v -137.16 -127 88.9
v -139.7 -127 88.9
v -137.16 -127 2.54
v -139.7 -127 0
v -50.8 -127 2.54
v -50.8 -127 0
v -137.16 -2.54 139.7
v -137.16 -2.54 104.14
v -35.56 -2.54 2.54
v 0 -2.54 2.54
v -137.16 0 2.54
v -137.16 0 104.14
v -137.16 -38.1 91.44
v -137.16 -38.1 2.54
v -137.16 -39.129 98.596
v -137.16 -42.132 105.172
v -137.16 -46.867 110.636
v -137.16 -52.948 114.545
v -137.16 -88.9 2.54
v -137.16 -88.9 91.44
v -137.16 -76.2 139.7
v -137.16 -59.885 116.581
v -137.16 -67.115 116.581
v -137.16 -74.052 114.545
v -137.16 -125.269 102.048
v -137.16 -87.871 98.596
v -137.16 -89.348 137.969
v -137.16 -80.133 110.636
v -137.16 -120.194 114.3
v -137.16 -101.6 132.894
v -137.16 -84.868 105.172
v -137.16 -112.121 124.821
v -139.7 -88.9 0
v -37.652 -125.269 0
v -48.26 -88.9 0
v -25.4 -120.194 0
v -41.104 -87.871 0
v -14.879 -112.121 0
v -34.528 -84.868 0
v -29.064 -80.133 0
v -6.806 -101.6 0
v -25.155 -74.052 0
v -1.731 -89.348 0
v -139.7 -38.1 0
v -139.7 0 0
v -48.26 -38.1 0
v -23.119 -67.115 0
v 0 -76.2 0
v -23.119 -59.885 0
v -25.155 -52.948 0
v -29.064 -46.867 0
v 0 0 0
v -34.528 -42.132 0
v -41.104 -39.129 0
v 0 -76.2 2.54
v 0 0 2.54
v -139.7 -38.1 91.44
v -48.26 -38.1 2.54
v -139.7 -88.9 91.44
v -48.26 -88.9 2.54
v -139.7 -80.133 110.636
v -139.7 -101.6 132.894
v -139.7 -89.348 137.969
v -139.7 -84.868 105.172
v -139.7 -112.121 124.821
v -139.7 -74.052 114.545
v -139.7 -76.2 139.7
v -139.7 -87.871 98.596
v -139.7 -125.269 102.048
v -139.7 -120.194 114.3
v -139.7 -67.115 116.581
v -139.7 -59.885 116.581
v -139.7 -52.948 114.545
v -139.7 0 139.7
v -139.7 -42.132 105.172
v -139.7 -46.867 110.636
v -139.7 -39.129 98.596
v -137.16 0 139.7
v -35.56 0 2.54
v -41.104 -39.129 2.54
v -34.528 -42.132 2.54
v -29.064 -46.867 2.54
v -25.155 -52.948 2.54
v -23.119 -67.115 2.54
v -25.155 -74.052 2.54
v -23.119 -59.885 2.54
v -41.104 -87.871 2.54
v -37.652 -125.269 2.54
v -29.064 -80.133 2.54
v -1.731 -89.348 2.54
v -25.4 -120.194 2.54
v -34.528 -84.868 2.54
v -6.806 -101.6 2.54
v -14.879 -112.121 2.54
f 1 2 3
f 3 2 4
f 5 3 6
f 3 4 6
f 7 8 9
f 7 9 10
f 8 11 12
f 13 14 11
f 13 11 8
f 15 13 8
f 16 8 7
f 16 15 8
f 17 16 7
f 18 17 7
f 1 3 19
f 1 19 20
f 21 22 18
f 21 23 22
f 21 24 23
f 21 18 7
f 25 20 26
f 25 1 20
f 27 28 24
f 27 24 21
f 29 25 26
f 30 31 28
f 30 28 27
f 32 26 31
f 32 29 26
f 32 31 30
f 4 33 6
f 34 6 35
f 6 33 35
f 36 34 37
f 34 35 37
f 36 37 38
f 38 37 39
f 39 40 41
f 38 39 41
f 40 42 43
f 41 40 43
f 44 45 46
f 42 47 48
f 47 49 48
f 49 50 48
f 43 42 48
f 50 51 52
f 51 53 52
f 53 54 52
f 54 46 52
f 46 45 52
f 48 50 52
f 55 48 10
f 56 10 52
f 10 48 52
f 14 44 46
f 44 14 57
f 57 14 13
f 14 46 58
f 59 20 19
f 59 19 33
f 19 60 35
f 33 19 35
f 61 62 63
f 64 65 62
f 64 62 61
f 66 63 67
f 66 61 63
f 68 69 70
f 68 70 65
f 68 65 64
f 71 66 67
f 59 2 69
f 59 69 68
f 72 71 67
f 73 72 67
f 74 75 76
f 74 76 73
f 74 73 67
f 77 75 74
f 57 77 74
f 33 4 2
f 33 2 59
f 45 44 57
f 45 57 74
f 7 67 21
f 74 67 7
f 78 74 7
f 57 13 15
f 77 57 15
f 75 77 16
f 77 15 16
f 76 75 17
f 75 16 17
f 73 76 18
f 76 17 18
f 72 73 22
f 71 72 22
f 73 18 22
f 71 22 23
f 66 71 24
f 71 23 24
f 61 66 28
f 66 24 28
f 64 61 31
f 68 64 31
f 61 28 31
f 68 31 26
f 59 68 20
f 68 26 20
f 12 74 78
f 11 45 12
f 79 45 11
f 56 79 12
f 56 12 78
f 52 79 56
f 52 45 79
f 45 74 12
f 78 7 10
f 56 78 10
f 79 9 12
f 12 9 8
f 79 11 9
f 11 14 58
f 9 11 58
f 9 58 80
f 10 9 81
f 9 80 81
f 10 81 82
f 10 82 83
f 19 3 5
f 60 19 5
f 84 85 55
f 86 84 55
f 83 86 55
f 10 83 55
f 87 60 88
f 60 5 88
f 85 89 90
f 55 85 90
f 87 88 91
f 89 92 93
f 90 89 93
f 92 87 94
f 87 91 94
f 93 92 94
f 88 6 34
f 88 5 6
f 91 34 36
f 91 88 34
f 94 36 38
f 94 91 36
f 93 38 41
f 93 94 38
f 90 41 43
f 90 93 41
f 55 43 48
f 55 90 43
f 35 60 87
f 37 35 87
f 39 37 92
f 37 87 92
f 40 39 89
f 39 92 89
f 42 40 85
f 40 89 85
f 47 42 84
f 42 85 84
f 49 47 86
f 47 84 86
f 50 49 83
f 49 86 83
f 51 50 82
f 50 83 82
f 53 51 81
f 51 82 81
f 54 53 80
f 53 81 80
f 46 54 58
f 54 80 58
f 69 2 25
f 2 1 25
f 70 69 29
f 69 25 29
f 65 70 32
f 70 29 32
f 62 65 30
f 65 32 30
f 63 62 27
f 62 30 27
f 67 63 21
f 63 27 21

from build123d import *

# Parameters (mm, degrees)
F0_W      = 139.7
F0_H      = 127
F1_DEPTH  = 139.7
F2_W      = 137.16
F2_H      = 137.16
F3_DEPTH  = 124.46
F5_DEPTH  = 25.4
F7_DEPTH  = 25.4
F9_DEPTH  = 25.4
F11_DEPTH = 25.4
F12_R     = 50.8


with BuildPart() as f1:
    # F0 (on Top) → F1 (new body)
    with BuildSketch(Plane.XY):
        with Locations((-69.85, -63.5)):
            Rectangle(F0_W, F0_H)
    extrude(amount=F1_DEPTH)

    # F2 (on face) → F3 (cut)
    with BuildSketch(Plane.XZ.offset(127)):
        with Locations((-68.58, 71.12)):
            Rectangle(F2_W, F2_H)
    extrude(amount=-F3_DEPTH, mode=Mode.SUBTRACT)

    # F4 (on face) → F5 (cut)
    with BuildSketch(Plane.XZ.offset(2.54)):
        Polygon((-6.918556, 178.288981), (-137.16, 139.7), (0, 2.54), (55.803198, 142.750546), align=None)
    extrude(amount=-F5_DEPTH, mode=Mode.SUBTRACT)

    # F6 (on face) → F7 (cut)
    with BuildSketch(Plane.XZ.offset(2.54)):
        Polygon((-137.16, 104.14), (-137.16, 2.54), (-35.56, 2.54), align=None)
    extrude(amount=-F7_DEPTH, mode=Mode.SUBTRACT)

    # F8 (on face) → F9 (cut)
    with BuildSketch(Plane.XY.offset(2.54)):
        with BuildLine():
            Line((-137.16, -38.1), (-137.16, -88.9))
            Line((-137.16, -88.9), (-48.26, -88.9))
            ThreePointArc((-48.26, -88.9), (-22.86, -63.5), (-48.26, -38.1))
            Line((-48.26, -38.1), (-137.16, -38.1))
        make_face()
    extrude(amount=-F9_DEPTH, mode=Mode.SUBTRACT)

    # F10 (on face) → F11 (cut)
    with BuildSketch(Plane.YZ.offset(-137.16)):
        with BuildLine():
            Line((-38.1, 0), (-38.1, 2.54))
            Line((-38.1, 2.54), (-38.1, 91.44))
            ThreePointArc((-38.1, 91.44), (-63.5, 116.84), (-88.9, 91.44))
            Line((-88.9, 91.44), (-88.9, 2.54))
            Line((-88.9, 2.54), (-88.9, 0))
            Line((-88.9, 0), (-38.1, 0))
        make_face()
    extrude(amount=-F11_DEPTH, mode=Mode.SUBTRACT)

    # F12
    f12_edges = [f1.edges().sort_by_distance(p)[0] for p in [
        (0, -127, 1.27),
        (-138.43, -127, 139.7),
    ]]
    fillet(f12_edges, radius=F12_R)


solid = f1.part
